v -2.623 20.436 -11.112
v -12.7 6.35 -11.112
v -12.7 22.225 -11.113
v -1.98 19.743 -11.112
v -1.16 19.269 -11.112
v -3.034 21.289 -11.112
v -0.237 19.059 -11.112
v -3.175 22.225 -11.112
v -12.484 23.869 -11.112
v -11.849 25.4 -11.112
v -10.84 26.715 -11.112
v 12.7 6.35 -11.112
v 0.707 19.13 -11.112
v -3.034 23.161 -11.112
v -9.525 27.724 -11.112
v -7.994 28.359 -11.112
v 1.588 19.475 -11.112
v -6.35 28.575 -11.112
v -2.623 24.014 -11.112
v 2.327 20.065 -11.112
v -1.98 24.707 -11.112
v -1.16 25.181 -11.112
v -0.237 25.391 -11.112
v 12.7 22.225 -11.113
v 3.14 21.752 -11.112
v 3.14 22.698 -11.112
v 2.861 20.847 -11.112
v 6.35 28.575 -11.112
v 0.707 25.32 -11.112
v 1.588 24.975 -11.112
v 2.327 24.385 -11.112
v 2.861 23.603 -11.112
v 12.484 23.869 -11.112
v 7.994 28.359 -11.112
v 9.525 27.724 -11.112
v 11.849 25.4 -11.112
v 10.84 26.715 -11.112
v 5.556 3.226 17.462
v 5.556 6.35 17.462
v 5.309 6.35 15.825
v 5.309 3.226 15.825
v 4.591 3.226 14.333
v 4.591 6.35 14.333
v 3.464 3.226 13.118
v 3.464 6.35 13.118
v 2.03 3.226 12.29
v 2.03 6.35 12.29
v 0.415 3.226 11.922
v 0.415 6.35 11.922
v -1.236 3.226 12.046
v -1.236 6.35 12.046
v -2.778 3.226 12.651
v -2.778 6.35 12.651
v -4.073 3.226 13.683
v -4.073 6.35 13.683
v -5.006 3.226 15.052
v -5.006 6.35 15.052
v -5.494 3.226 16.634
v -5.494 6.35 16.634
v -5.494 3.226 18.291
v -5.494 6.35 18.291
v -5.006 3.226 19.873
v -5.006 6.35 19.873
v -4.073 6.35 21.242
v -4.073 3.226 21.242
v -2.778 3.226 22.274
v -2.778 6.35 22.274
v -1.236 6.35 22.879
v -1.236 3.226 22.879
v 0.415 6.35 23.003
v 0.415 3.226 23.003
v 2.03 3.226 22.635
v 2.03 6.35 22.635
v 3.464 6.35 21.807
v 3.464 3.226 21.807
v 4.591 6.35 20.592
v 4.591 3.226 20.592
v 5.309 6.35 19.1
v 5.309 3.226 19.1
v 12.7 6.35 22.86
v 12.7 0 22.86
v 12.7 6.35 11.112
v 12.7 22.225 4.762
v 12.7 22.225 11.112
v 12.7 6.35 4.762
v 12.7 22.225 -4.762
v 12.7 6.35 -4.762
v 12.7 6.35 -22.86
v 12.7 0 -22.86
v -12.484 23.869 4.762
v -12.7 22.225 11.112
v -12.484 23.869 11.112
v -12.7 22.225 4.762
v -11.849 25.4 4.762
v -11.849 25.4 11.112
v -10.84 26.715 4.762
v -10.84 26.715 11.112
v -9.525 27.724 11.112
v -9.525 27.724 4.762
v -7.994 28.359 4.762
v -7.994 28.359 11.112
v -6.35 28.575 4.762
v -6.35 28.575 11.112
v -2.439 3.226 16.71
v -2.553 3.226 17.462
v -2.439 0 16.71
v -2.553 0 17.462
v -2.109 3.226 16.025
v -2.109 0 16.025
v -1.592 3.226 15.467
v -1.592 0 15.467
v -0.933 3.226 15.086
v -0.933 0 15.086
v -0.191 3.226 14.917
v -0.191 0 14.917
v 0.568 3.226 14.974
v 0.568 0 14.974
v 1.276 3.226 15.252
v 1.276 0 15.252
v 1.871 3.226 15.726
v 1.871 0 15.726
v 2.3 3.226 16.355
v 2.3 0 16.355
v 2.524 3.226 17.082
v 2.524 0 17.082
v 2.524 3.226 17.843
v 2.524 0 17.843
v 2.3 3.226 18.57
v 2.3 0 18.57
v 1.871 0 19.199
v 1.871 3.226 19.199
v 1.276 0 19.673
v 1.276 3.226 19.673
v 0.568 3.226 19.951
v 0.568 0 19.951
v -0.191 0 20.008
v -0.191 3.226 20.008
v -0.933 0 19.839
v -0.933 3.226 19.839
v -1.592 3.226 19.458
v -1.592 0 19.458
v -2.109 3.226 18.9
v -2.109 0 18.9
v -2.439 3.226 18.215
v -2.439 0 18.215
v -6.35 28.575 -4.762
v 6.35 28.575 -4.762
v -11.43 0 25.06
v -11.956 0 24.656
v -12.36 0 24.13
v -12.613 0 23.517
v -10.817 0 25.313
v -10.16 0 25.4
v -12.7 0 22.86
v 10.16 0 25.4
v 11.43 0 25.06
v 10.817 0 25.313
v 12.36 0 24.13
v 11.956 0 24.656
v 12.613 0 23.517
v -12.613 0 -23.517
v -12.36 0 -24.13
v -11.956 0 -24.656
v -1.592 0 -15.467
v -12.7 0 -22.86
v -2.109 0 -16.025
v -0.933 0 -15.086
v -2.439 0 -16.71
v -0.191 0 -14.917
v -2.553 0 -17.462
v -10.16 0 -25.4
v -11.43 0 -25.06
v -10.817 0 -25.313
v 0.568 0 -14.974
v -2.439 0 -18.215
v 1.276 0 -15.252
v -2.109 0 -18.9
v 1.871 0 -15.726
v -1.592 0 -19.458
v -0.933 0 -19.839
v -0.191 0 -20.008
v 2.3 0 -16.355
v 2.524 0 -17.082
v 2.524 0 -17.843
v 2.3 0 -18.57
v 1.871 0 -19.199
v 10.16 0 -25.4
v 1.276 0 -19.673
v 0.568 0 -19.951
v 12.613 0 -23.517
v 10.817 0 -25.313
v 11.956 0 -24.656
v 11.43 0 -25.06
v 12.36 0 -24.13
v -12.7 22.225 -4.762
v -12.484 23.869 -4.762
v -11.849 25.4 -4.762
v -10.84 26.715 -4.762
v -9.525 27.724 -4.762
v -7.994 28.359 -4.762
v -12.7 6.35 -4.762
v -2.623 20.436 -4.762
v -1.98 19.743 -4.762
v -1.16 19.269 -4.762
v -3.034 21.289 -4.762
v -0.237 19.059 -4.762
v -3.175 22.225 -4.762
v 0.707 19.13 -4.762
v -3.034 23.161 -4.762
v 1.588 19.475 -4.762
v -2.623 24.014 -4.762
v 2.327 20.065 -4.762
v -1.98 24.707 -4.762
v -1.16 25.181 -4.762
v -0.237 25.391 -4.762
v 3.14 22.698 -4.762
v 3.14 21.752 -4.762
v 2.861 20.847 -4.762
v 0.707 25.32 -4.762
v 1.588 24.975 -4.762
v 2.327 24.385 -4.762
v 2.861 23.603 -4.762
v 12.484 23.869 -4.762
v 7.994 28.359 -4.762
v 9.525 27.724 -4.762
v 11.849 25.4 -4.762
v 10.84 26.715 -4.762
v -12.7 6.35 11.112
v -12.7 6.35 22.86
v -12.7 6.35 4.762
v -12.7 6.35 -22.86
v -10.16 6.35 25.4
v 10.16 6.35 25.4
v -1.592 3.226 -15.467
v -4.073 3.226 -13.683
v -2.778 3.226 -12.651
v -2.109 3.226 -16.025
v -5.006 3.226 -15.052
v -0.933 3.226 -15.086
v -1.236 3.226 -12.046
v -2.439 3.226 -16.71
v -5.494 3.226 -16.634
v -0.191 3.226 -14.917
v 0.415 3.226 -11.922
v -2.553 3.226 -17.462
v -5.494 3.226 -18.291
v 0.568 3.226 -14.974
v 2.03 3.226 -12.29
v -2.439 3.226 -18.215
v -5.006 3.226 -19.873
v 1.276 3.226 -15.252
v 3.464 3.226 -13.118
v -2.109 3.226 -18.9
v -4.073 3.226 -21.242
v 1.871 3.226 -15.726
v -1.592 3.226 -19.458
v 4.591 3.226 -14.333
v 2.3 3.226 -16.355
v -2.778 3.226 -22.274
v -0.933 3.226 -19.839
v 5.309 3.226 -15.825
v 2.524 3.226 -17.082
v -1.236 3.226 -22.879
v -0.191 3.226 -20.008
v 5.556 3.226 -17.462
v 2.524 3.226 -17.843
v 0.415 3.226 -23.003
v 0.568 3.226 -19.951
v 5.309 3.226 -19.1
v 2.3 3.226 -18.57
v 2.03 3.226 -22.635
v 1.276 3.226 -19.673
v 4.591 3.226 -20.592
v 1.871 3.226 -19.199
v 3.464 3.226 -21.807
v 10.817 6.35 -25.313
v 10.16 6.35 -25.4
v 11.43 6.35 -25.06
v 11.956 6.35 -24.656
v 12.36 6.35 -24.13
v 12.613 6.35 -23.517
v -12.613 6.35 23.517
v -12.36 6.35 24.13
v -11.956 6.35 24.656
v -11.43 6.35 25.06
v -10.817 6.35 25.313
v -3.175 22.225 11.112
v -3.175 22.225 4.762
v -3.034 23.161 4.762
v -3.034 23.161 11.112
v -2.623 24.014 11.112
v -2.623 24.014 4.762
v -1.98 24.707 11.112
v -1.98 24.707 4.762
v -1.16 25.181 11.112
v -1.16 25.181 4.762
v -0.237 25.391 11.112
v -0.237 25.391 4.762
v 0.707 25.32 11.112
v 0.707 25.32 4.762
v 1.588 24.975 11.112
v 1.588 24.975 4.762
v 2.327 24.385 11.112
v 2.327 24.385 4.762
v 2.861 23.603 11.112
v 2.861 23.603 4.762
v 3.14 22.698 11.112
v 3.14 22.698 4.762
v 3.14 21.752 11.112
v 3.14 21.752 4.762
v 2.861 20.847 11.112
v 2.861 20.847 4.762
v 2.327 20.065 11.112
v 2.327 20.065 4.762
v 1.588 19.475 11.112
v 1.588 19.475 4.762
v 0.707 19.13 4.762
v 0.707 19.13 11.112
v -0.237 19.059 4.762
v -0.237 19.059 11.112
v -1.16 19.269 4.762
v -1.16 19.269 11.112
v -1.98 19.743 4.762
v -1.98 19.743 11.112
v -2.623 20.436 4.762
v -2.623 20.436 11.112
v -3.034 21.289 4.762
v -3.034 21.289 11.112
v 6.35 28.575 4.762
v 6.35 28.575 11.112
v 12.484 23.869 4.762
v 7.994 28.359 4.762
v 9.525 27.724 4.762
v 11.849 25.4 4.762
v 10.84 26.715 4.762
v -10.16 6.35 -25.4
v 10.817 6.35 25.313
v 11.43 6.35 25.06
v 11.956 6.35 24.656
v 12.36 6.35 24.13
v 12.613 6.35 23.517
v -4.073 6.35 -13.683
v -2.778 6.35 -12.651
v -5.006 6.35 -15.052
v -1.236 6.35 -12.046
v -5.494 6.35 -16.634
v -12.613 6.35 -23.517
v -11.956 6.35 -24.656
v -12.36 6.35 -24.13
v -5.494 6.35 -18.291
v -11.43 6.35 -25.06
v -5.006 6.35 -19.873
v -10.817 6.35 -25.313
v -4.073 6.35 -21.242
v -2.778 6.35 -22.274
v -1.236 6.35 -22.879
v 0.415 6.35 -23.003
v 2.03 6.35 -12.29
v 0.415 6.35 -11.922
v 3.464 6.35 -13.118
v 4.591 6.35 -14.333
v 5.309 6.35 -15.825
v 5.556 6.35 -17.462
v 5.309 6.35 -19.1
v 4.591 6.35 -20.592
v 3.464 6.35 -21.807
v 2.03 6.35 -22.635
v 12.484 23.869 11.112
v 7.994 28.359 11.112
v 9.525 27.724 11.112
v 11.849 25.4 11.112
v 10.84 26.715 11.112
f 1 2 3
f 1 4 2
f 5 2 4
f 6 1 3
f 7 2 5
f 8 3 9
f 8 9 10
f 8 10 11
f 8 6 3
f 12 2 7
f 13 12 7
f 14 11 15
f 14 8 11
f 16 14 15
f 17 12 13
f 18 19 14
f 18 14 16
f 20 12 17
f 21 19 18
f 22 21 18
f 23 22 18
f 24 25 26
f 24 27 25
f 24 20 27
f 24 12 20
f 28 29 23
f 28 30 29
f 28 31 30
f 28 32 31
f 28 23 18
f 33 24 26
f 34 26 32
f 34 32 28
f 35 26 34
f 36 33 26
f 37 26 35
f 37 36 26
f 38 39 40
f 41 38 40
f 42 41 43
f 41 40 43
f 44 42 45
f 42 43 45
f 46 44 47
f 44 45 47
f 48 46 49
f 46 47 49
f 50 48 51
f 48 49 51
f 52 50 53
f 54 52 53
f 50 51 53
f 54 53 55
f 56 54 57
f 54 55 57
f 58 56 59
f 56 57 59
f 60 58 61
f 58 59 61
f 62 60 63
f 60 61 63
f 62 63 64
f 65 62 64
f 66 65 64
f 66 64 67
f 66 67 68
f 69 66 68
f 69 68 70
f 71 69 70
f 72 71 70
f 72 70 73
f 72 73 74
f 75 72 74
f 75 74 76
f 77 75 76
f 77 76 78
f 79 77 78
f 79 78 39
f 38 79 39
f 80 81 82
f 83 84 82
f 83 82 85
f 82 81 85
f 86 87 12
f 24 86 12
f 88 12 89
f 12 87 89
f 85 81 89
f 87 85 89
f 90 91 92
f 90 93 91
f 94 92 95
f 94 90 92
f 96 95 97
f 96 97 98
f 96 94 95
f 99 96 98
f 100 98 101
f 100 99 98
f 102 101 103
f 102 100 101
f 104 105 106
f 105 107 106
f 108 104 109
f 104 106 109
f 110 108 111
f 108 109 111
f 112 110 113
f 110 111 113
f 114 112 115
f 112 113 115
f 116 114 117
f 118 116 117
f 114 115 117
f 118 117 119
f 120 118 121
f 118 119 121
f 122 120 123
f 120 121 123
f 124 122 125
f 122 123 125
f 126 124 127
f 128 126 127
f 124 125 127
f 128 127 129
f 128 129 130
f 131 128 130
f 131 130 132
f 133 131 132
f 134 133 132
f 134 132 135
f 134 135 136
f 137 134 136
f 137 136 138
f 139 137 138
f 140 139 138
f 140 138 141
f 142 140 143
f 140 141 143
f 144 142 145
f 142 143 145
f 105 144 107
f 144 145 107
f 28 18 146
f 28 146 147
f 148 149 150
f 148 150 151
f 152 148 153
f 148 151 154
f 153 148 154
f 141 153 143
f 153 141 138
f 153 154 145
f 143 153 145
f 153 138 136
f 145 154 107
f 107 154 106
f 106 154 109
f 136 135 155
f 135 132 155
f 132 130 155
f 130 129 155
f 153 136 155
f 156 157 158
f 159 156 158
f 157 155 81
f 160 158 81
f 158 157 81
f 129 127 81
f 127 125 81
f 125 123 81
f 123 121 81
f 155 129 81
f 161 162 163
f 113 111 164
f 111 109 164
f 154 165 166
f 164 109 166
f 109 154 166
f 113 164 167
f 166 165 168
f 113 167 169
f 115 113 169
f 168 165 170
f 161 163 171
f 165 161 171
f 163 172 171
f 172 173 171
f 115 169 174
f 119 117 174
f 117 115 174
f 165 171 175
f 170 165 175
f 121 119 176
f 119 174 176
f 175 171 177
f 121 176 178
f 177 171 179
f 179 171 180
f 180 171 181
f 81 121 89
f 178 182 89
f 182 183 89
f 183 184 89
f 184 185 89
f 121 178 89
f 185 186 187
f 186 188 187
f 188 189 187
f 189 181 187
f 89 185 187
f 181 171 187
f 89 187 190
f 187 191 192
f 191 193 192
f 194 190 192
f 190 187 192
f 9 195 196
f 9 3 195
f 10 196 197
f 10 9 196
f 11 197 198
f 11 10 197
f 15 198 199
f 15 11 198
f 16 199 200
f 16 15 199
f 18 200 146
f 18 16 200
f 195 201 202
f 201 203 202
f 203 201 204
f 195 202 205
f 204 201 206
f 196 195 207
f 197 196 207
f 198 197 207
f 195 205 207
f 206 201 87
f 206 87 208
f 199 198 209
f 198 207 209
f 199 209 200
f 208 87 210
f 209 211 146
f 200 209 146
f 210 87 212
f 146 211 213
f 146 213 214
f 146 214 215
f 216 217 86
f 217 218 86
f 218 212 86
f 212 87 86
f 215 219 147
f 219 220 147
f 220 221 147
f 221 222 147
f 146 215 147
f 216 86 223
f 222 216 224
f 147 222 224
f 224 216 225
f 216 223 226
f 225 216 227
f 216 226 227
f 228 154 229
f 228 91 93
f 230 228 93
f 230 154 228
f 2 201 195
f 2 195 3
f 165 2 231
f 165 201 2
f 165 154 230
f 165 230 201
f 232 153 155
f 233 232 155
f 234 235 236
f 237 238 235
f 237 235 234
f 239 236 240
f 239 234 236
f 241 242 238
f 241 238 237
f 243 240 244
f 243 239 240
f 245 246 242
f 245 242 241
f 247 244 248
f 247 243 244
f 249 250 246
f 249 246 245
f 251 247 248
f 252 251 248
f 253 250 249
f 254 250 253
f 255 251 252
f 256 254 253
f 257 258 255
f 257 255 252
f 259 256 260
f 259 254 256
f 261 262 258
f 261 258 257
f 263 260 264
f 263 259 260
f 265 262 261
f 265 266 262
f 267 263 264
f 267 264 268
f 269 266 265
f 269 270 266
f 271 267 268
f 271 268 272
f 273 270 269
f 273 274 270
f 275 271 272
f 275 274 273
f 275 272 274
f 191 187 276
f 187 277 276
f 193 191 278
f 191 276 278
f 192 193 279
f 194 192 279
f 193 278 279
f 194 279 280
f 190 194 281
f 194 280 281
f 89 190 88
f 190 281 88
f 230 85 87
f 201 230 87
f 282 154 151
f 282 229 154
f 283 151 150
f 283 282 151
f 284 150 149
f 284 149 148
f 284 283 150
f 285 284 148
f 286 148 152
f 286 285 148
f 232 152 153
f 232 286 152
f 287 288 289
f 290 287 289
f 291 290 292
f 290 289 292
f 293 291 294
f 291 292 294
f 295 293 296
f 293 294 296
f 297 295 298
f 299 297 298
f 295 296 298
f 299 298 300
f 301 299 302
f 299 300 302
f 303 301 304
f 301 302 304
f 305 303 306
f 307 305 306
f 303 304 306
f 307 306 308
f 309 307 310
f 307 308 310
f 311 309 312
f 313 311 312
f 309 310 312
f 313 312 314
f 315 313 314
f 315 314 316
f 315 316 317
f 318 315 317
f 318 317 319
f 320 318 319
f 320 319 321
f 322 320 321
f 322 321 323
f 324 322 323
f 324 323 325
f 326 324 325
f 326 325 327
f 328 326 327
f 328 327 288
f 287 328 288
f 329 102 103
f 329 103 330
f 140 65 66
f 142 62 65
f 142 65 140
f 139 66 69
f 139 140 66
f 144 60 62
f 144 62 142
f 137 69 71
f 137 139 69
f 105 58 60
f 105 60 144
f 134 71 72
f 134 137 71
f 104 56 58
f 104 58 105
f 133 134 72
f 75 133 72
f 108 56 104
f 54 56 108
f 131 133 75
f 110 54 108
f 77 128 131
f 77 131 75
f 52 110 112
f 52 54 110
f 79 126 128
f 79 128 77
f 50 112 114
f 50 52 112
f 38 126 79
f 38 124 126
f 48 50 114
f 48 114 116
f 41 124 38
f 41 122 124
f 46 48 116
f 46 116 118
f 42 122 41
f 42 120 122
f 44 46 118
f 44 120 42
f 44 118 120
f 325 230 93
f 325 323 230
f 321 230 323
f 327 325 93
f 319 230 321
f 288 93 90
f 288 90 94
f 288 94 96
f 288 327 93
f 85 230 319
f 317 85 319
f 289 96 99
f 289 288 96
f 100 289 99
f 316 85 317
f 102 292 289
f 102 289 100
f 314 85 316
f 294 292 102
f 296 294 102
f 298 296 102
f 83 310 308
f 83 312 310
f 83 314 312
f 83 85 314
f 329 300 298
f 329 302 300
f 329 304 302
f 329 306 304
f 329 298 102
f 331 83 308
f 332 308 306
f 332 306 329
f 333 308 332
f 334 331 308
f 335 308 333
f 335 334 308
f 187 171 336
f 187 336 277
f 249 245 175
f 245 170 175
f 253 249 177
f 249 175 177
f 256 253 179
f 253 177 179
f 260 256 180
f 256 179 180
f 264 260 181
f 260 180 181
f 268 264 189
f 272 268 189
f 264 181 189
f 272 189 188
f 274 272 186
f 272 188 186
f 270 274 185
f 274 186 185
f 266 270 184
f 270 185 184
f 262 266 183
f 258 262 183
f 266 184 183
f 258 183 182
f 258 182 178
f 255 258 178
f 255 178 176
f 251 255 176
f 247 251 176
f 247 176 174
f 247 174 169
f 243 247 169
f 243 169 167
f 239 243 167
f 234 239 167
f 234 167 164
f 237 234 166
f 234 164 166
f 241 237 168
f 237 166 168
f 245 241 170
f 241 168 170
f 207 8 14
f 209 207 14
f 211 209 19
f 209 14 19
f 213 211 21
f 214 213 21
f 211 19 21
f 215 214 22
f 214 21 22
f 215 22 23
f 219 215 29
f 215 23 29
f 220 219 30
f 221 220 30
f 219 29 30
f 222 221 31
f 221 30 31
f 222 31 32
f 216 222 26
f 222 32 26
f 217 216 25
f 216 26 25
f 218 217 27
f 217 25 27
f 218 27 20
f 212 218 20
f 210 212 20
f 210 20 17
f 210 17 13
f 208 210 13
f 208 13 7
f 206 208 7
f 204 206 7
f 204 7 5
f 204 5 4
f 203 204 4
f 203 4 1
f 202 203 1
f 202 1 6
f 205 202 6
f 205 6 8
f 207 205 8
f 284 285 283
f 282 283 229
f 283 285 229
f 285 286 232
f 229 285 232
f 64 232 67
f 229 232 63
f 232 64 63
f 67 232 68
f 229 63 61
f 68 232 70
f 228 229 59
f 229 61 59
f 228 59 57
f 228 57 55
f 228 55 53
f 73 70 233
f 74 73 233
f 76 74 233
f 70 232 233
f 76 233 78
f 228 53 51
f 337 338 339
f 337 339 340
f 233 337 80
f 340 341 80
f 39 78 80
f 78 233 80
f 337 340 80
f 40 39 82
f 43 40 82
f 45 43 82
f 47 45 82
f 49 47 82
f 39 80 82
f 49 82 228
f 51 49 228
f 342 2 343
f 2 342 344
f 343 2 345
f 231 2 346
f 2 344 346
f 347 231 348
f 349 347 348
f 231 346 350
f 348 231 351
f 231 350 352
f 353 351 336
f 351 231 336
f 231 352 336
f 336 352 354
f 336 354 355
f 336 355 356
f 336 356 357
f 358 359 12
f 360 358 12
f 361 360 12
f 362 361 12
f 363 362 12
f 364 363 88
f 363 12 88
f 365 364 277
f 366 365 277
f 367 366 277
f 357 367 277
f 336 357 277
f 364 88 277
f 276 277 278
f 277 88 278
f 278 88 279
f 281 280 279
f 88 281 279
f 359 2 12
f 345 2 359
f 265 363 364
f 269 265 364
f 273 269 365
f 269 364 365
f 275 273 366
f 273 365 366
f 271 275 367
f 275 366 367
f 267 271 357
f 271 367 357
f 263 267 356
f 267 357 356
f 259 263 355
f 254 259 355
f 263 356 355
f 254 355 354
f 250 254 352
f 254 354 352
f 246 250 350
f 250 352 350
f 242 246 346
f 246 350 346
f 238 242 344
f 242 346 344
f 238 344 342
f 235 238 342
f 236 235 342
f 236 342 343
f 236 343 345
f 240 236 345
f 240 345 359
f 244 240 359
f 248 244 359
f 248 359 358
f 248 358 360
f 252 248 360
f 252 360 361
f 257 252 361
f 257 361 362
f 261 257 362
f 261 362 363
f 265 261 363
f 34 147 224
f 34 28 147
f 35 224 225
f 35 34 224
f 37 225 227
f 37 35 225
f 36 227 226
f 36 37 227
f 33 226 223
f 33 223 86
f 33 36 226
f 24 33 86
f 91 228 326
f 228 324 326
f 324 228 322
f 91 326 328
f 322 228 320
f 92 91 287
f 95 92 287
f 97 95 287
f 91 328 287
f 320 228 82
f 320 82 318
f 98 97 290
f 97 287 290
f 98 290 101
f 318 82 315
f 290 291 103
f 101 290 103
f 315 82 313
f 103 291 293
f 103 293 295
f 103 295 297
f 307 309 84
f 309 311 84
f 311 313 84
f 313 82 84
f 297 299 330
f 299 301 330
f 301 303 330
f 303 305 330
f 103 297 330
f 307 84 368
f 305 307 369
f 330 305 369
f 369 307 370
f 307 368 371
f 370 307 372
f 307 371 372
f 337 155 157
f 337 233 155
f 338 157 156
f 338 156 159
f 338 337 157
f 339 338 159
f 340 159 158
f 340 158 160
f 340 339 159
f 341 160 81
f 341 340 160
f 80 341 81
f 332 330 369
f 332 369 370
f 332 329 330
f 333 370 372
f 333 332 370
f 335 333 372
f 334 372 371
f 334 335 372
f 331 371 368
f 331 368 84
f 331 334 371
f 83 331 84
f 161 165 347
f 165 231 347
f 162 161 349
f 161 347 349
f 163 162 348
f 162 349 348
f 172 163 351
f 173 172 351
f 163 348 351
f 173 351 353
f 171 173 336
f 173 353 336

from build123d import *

# Parameters (mm, degrees)
SKETCH2_W                                           = 25.4
SKETCH2_H                                           = 50.8
BOSS_EXTRUDE2_DEPTH                                 = 28.575
SKETCH3_W                                           = 14.2875
SKETCH3_H                                           = 22.225
SKETCH3_W_2                                         = 9.525
CUT_EXTRUDE1_DEPTH                                  = 26.4
CBORE_FOR_10_BINDING_HEAD_MACHINE_SCREW_D           = 5.1054
CBORE_FOR_10_BINDING_HEAD_MACHINE_SCREW_DEPTH       = 6.35
CBORE_FOR_10_BINDING_HEAD_MACHINE_SCREW_CBORE_D     = 11.1125
CBORE_FOR_10_BINDING_HEAD_MACHINE_SCREW_CBORE_DEPTH = 3.1242
CBORE_FOR_10_BINDING_HEAD_MACHINE_SCREW_TIP         = 1.533816902
SKETCH8_R                                           = 3.175
CUT_EXTRUDE3_DEPTH                                  = 37.5125
FILLET1_R                                           = 6.35
FILLET2_R                                           = 2.54


with BuildPart() as part:
    # Sketch2 → Boss-Extrude2 (new body)
    with BuildSketch(Plane(origin=(0, 0, 0), x_dir=(1, 0, 0), z_dir=(0, 1, 0))):
        Rectangle(SKETCH2_W, SKETCH2_H)
    extrude(amount=BOSS_EXTRUDE2_DEPTH)

    # Sketch3 → Cut-Extrude1 (cut, through all)
    with BuildSketch(Plane(origin=(12.7, 0, 0), x_dir=(0, 0, -1), z_dir=(1, 0, 0))):
        with Locations((-18.25625, 17.4625)):
            Rectangle(SKETCH3_W, SKETCH3_H)
        with Locations((18.25625, 17.4625)):
            Rectangle(SKETCH3_W, SKETCH3_H)
        with Locations((0, 17.4625)):
            Rectangle(SKETCH3_W_2, SKETCH3_H)
    extrude(amount=-CUT_EXTRUDE1_DEPTH, mode=Mode.SUBTRACT)

    # CBORE for #10 Binding Head Machine Screw1
    with Locations(Plane(origin=(0, 6.35, 0), x_dir=(1, 0, 0), z_dir=(0, 1, 0))):
        with Locations((0, -17.4625), (0, 17.4625)):
            CounterBoreHole(CBORE_FOR_10_BINDING_HEAD_MACHINE_SCREW_D / 2, CBORE_FOR_10_BINDING_HEAD_MACHINE_SCREW_CBORE_D / 2, CBORE_FOR_10_BINDING_HEAD_MACHINE_SCREW_CBORE_DEPTH, depth=CBORE_FOR_10_BINDING_HEAD_MACHINE_SCREW_DEPTH)
            with Locations((0, 0, -(CBORE_FOR_10_BINDING_HEAD_MACHINE_SCREW_DEPTH + CBORE_FOR_10_BINDING_HEAD_MACHINE_SCREW_TIP / 2))):  # 118° drill point
                Cone(0, CBORE_FOR_10_BINDING_HEAD_MACHINE_SCREW_D / 2, CBORE_FOR_10_BINDING_HEAD_MACHINE_SCREW_TIP, mode=Mode.SUBTRACT)

    # Sketch8 → Cut-Extrude3 (cut, through all)
    with BuildSketch(Plane(origin=(0, 0, -11.1125), x_dir=(-1, 0, 0), z_dir=(0, 0, -1))):
        with Locations((0, 22.225)):
            Circle(SKETCH8_R)
    extrude(amount=-CUT_EXTRUDE3_DEPTH, mode=Mode.SUBTRACT)

    # Fillet1
    fillet1_edges = [part.edges().sort_by_distance(p)[0] for p in [
        (12.7, 28.575, 7.9375),
        (-12.7, 28.575, -7.9375),
        (-12.7, 28.575, 7.9375),
        (12.7, 28.575, -7.9375),
    ]]
    fillet(fillet1_edges, radius=FILLET1_R)

    # Fillet2
    fillet2_edges = [part.edges().sort_by_distance(p)[0] for p in [
        (12.7, 3.175, 25.4),
        (-12.7, 3.175, 25.4),
        (-12.7, 3.175, -25.4),
        (12.7, 3.175, -25.4),
    ]]
    fillet(fillet2_edges, radius=FILLET2_R)


solid = part.part
